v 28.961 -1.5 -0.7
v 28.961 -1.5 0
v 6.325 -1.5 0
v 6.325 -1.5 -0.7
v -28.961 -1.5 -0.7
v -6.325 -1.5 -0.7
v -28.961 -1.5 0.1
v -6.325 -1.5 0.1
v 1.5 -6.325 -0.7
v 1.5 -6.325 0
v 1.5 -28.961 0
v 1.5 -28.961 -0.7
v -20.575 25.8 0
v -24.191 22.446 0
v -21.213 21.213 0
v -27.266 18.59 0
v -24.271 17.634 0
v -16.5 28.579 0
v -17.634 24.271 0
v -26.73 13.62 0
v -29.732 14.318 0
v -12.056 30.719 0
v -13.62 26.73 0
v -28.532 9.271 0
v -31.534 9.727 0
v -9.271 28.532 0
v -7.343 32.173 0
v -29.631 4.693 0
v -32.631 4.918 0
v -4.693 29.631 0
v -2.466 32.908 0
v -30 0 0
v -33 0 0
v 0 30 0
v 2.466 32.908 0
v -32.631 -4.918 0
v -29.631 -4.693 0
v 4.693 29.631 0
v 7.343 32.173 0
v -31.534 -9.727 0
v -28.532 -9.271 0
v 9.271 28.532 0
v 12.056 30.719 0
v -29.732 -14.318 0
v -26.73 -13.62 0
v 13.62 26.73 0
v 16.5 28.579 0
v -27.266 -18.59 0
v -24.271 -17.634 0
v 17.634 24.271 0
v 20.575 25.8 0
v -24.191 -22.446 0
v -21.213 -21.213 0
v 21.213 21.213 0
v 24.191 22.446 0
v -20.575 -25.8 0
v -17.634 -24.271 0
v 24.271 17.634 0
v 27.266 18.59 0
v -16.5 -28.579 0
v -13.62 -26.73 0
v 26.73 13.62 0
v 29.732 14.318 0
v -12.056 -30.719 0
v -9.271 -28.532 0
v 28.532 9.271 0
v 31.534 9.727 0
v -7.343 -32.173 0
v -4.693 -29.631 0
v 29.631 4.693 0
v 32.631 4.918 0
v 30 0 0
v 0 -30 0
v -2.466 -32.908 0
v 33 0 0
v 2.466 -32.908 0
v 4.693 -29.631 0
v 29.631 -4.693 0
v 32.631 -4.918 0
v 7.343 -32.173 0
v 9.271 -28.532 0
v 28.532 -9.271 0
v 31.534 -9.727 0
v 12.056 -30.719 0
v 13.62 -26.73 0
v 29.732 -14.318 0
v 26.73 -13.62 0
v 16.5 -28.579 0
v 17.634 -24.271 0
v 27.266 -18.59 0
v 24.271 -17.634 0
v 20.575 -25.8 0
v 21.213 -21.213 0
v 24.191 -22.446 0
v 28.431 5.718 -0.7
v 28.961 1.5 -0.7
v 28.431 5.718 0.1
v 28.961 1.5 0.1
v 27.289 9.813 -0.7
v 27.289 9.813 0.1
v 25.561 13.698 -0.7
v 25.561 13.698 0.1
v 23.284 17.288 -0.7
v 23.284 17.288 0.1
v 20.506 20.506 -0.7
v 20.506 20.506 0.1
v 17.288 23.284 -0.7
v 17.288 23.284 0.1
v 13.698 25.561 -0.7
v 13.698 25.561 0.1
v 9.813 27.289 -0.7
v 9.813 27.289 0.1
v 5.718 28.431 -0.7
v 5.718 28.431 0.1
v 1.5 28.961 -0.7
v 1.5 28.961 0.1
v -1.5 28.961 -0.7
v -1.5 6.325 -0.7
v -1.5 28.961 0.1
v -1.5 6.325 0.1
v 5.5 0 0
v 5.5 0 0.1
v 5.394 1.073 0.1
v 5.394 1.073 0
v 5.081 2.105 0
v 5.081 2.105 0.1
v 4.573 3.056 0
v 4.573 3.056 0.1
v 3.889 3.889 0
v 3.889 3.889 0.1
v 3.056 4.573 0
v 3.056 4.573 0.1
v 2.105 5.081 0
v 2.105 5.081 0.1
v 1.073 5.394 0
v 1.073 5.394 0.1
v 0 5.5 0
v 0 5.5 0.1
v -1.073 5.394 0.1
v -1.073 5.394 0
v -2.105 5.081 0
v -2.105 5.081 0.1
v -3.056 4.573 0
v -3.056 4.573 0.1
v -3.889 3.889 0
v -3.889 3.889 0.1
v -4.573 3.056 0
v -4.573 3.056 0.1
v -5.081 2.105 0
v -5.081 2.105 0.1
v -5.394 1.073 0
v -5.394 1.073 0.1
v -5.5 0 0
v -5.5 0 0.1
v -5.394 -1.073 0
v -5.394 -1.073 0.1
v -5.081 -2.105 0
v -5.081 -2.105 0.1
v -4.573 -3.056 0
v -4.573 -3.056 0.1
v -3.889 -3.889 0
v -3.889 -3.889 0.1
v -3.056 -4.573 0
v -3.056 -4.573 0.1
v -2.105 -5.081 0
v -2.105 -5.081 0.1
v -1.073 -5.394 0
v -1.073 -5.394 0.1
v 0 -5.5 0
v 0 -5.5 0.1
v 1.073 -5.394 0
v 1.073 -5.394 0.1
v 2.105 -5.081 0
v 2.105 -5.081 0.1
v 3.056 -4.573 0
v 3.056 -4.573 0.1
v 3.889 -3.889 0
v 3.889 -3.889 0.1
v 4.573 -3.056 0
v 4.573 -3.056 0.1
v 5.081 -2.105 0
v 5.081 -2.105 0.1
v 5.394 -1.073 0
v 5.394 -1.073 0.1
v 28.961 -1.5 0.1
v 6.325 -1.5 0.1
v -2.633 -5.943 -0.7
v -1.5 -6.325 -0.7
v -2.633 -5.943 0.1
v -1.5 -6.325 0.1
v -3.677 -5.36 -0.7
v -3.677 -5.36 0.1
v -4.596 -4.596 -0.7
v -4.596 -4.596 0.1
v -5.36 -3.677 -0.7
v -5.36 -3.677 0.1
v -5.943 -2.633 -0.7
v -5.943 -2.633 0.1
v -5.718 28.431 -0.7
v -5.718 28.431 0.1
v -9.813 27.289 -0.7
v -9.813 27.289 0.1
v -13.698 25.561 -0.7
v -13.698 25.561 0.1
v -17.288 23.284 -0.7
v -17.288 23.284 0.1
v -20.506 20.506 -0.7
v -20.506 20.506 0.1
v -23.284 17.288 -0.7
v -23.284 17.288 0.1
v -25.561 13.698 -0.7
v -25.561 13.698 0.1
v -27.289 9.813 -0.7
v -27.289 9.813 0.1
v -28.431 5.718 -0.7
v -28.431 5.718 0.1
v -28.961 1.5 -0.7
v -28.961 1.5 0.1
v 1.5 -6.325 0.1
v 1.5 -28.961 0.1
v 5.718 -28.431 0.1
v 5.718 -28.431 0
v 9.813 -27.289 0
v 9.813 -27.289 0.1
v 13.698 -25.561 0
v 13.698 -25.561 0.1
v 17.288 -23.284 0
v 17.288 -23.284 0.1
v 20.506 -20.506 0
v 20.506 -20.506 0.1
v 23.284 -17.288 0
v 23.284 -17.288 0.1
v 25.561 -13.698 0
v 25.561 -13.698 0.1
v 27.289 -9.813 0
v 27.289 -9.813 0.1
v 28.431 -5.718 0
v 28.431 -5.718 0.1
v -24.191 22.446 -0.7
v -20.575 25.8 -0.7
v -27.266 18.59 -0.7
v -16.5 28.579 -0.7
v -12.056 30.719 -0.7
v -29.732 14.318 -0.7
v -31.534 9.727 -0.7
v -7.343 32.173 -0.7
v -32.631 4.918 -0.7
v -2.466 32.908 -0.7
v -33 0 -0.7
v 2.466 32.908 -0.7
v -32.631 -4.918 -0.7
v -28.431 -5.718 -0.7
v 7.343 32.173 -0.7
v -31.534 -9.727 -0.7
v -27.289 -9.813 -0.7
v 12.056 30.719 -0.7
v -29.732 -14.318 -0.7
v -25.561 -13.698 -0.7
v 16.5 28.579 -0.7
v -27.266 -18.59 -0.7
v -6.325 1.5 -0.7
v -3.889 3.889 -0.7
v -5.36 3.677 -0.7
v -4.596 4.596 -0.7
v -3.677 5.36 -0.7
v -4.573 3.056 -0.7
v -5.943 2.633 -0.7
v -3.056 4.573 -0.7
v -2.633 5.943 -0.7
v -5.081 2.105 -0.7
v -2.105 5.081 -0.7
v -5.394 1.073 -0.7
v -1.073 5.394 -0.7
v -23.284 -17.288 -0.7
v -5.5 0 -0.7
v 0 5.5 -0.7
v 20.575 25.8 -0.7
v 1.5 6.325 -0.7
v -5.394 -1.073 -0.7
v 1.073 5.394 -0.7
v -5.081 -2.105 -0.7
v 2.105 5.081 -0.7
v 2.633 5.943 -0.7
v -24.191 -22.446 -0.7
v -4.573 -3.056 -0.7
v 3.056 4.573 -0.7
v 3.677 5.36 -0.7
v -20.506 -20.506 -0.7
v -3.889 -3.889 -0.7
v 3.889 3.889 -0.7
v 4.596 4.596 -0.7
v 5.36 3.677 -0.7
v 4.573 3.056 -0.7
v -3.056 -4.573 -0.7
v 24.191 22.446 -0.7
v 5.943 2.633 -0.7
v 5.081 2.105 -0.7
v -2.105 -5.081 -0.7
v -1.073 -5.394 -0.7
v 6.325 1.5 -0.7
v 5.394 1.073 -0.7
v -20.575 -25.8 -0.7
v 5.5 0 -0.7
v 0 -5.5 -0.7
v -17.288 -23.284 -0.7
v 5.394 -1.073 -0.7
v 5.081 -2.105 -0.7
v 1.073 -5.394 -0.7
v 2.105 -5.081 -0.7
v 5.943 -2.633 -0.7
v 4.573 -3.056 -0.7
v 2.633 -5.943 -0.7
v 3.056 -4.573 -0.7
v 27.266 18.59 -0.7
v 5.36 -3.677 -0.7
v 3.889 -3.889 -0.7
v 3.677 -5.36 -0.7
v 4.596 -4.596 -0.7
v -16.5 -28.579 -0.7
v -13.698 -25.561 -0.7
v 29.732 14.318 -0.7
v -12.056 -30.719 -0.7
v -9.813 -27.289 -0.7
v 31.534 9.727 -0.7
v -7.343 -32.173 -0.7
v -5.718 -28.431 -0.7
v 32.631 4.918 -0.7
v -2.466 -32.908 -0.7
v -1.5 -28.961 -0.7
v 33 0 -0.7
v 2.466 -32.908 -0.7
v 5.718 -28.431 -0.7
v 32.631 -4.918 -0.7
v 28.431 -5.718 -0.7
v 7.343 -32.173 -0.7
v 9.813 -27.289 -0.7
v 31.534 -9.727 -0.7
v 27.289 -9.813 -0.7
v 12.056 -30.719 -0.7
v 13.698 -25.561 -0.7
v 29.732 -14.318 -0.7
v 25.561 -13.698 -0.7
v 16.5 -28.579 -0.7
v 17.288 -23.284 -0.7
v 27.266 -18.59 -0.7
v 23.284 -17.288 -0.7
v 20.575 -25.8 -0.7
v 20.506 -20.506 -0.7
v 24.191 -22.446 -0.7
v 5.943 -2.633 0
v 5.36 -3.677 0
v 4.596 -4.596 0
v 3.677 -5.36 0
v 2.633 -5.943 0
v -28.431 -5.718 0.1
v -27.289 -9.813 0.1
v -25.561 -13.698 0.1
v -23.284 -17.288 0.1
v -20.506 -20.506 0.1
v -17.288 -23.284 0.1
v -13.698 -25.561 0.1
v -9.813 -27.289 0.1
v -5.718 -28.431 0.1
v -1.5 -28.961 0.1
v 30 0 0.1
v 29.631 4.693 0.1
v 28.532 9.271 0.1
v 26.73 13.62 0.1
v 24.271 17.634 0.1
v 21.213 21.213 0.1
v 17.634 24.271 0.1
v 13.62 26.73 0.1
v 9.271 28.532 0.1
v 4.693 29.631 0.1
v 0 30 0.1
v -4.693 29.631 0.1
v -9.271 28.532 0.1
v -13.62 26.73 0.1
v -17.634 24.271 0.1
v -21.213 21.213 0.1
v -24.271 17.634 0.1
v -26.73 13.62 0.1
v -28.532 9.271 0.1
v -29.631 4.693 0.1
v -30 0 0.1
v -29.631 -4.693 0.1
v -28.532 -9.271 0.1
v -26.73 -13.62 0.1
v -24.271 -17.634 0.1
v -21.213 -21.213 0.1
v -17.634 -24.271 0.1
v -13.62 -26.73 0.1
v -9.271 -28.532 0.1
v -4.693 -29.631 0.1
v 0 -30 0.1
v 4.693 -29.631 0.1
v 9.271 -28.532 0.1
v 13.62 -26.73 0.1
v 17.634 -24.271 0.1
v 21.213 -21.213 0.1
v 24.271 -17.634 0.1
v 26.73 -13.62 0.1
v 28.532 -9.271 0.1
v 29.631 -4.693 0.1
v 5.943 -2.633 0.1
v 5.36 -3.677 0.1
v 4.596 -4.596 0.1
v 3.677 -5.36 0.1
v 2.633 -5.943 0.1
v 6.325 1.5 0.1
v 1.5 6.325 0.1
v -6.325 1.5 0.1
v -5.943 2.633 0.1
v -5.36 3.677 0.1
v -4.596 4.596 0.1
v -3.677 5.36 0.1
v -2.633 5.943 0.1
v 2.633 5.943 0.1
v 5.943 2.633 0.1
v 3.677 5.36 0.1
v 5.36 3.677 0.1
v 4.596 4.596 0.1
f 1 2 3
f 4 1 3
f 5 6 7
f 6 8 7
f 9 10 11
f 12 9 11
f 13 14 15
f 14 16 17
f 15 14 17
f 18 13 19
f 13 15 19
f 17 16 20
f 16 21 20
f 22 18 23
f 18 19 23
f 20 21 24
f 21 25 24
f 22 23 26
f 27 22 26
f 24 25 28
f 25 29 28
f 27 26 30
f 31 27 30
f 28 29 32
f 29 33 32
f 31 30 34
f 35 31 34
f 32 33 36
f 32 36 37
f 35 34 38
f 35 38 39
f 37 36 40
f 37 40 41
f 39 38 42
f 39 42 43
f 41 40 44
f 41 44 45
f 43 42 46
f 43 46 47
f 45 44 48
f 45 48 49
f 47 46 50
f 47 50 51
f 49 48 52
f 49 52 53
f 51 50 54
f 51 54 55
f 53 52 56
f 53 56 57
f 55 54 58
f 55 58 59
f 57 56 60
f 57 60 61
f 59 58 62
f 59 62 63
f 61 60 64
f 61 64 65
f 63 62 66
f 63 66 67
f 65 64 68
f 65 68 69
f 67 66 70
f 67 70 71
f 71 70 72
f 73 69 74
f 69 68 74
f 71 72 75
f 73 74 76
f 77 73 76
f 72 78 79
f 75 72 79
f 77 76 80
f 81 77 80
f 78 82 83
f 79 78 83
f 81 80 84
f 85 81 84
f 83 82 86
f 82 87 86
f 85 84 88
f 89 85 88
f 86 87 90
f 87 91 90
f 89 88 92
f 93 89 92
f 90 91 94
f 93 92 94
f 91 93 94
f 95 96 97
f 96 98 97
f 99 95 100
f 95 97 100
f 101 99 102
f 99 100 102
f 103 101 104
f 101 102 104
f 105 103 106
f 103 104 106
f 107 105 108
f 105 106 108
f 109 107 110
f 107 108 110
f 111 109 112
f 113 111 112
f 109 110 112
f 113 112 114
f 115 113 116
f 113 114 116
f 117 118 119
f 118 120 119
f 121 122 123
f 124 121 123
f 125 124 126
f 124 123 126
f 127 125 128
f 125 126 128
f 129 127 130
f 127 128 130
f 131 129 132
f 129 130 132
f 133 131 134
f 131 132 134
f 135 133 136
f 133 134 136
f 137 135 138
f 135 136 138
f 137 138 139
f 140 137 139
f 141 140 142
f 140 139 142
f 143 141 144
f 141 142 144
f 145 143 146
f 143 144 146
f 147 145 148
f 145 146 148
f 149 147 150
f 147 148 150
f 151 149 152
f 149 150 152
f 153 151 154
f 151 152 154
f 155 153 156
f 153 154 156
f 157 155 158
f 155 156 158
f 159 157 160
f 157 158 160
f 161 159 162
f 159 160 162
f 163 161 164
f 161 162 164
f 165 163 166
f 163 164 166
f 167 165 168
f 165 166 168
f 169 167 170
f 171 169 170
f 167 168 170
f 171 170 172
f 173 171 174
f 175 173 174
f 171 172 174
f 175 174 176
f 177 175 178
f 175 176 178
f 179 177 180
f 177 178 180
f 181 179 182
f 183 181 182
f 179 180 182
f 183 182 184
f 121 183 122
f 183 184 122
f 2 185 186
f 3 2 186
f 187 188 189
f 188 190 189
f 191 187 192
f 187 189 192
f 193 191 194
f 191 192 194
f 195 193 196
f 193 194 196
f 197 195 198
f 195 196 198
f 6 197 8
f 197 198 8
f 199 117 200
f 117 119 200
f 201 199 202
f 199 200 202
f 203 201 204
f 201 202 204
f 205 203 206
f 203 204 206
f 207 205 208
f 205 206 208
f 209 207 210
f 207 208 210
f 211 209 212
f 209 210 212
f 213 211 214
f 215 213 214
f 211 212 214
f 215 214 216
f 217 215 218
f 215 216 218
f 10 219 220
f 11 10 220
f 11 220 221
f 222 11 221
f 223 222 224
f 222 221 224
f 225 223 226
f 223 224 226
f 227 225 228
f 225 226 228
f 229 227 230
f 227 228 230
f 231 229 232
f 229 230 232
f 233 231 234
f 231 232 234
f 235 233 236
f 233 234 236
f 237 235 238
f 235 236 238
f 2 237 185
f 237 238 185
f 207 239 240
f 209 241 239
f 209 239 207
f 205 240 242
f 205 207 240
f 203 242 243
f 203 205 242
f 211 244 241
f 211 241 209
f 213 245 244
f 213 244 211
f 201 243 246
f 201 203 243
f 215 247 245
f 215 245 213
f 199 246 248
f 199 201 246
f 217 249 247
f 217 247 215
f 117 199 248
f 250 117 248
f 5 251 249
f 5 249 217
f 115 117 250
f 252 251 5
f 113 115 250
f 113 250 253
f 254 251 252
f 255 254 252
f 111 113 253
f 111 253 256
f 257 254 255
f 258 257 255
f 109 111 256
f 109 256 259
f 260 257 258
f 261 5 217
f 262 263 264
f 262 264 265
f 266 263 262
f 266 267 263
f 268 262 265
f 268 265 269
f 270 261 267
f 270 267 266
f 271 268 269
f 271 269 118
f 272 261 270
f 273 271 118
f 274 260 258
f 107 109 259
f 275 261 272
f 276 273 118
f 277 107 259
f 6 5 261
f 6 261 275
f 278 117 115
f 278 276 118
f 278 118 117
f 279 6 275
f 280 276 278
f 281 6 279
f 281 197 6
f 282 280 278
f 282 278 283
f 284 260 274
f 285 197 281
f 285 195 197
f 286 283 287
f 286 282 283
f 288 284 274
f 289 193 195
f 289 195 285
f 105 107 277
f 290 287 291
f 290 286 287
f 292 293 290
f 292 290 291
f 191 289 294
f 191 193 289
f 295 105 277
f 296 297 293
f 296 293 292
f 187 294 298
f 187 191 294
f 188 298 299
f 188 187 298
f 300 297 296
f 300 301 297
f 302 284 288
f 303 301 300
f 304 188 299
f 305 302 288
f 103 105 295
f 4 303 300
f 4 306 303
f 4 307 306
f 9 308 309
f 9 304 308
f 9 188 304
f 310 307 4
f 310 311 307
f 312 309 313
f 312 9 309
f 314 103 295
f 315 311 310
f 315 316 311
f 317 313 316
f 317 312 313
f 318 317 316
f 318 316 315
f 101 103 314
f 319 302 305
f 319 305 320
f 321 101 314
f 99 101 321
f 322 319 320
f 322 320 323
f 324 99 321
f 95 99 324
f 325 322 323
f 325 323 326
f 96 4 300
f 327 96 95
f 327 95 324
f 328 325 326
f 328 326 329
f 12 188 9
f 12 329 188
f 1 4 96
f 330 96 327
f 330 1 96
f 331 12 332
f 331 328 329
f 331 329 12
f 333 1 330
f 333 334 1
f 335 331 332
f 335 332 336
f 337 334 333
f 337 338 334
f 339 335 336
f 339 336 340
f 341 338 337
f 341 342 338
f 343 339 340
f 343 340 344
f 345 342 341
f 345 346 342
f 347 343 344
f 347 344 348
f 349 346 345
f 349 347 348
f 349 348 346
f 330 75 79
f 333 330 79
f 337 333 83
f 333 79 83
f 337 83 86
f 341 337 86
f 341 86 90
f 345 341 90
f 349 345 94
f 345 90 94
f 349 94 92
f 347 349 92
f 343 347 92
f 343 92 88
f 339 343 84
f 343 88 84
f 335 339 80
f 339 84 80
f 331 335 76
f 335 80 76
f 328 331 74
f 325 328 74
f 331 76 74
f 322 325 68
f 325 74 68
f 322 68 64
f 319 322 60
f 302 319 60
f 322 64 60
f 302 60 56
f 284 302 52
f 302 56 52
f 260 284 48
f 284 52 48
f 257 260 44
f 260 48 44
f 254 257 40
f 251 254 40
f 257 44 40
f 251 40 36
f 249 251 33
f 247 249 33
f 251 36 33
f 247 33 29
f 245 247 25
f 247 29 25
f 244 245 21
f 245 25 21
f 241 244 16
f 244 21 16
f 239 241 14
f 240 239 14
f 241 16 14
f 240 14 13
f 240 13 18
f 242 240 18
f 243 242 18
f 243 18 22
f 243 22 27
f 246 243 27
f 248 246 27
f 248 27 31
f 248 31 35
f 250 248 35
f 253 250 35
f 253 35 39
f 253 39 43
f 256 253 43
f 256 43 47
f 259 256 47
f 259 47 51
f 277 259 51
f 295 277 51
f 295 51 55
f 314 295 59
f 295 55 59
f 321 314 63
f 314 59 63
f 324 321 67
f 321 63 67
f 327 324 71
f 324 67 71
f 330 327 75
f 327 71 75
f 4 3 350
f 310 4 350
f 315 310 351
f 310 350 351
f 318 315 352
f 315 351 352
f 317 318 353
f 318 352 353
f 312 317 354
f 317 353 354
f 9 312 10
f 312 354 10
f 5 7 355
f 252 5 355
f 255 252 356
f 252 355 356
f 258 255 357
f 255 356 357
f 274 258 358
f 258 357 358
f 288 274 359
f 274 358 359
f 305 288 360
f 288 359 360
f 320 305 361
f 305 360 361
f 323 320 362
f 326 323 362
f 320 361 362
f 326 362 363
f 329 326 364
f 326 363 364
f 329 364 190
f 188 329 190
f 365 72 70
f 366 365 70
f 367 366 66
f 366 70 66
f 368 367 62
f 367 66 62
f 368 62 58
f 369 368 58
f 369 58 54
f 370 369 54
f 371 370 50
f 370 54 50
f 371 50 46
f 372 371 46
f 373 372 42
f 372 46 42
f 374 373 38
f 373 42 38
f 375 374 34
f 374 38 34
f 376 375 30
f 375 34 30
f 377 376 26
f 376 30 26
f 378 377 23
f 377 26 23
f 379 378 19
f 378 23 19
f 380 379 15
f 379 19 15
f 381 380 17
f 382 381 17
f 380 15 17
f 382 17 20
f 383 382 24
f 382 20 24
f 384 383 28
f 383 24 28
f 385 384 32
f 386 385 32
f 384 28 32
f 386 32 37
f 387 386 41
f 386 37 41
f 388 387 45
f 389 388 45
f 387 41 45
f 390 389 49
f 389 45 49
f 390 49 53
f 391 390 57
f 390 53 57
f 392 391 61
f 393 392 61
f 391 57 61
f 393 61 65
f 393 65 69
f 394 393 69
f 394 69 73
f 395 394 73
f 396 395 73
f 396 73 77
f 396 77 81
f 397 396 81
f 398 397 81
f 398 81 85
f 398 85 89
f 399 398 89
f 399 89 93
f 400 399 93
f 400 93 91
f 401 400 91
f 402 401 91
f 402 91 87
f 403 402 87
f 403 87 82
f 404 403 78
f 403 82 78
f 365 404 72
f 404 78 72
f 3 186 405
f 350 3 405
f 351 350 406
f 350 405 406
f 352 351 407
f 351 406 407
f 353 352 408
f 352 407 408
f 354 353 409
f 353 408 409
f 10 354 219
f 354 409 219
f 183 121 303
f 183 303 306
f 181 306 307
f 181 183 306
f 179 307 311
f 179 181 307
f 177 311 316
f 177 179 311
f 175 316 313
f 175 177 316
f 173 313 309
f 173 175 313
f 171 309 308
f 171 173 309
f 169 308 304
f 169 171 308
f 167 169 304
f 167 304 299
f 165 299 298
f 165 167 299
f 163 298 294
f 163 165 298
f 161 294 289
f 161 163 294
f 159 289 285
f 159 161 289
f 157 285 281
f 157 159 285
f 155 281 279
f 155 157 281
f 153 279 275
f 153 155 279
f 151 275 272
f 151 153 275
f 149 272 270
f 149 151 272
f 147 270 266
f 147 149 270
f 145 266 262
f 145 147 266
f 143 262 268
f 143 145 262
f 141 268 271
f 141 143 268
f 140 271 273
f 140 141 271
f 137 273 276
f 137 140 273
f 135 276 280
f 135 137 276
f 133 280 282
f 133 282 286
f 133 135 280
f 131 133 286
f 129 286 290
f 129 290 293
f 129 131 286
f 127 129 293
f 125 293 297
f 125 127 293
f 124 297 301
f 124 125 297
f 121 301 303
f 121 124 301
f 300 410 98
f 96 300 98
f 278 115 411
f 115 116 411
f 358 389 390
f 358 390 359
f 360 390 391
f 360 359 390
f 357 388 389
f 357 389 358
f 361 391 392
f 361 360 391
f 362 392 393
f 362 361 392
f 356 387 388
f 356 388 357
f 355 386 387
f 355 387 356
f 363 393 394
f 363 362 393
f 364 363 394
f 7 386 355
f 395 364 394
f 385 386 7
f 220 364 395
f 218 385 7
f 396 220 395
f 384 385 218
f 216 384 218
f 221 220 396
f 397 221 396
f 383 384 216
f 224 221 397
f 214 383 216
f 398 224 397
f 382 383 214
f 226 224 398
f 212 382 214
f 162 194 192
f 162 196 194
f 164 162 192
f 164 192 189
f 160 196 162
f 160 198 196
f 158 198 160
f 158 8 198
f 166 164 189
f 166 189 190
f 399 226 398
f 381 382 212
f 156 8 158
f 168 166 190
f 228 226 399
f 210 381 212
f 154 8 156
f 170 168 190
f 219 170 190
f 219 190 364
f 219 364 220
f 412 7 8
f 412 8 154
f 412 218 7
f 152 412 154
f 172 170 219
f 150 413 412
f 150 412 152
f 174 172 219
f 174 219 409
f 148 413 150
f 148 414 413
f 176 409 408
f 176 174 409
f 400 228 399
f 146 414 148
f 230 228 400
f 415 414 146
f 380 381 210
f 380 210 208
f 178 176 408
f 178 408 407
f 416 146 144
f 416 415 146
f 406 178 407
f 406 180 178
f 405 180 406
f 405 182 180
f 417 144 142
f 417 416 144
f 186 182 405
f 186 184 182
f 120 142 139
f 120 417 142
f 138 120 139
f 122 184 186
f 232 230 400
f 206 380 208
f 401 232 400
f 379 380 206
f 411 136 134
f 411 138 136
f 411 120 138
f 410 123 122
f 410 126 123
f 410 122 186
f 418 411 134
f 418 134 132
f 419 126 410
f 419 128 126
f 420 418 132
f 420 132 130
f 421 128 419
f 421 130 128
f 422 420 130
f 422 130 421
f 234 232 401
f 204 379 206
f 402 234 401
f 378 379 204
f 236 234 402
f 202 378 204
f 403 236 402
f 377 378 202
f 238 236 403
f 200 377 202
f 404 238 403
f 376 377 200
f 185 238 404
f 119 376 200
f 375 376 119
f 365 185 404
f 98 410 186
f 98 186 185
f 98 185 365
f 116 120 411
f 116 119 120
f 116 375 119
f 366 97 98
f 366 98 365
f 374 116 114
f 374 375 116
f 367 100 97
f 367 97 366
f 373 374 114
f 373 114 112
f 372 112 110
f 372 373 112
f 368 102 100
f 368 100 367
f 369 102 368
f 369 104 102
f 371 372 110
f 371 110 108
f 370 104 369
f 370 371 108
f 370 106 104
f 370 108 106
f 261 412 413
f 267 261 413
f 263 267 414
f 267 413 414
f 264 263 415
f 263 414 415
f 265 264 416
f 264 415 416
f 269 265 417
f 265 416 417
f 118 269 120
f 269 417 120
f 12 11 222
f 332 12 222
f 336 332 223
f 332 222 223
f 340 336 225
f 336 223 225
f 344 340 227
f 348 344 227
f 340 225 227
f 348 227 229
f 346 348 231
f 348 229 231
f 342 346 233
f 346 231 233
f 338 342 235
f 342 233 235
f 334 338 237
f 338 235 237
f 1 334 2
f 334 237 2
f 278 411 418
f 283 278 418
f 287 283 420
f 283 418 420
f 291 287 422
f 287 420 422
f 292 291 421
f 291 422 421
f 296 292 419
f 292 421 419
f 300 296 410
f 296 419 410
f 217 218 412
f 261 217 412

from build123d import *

# Parameters (mm, degrees)
F0_R     = 30
F1_DEPTH = 0.1
F2_R     = 5.5
F3_DEPTH = 0.1
F5_DEPTH = 0.1
F6_R     = 33
F6_R_2   = 30
F6_R_3   = 5.5
F7_DEPTH = 0.7


with BuildPart() as f1:
    # F0 (on Top) → F1 (new body)
    with BuildSketch(Plane.XY):
        Circle(F0_R)
    extrude(amount=F1_DEPTH)

    # F2 (on face) → F3 (cut, through all)
    with BuildSketch(Plane.XY.offset(0.1)):
        Circle(F2_R)
    extrude(amount=-F3_DEPTH, mode=Mode.SUBTRACT)

    # F4 (on face) → F5 (cut, through all)
    with BuildSketch(Plane.XY.offset(0.1)):
        with BuildLine():
            Line((6.3245553203, 1.5), (28.9611809151, 1.5))
            ThreePointArc((28.9611809151, 1.5), (20.5060966544, 20.5060966544), (1.5, 28.9611809151))
            Line((1.5, 28.9611809151), (1.5, 6.3245553203))
            ThreePointArc((1.5, 6.3245553203), (4.5961940777, 4.5961940777), (6.3245553203, 1.5))
        make_face()
        with BuildLine():
            Line((-1.5, 6.3245553203), (-1.5, 28.9611809151))
            ThreePointArc((-1.5, 28.9611809151), (-20.5060966544, 20.5060966544), (-28.9611809151, 1.5))
            Line((-28.9611809151, 1.5), (-6.3245553203, 1.5))
            ThreePointArc((-6.3245553203, 1.5), (-4.5961940777, 4.5961940777), (-1.5, 6.3245553203))
        make_face()
        with BuildLine():
            ThreePointArc((-28.9611809151, -1.5), (-20.5060966544, -20.5060966544), (-1.5, -28.9611809151))
            Line((-1.5, -28.9611809151), (-1.5, -6.3245553203))
            ThreePointArc((-1.5, -6.3245553203), (-4.5961940777, -4.5961940777), (-6.3245553203, -1.5))
            Line((-6.3245553203, -1.5), (-28.9611809151, -1.5))
        make_face()
        with BuildLine():
            ThreePointArc((1.5, -28.9611809151), (20.5060966544, -20.5060966544), (28.9611809151, -1.5))
            Line((28.9611809151, -1.5), (6.3245553203, -1.5))
            ThreePointArc((6.3245553203, -1.5), (4.5961940777, -4.5961940777), (1.5, -6.3245553203))
            Line((1.5, -6.3245553203), (1.5, -28.9611809151))
        make_face()
    extrude(amount=-F5_DEPTH, mode=Mode.SUBTRACT)

    # F6 (on face) → F7 (join)
    with BuildSketch(Plane(origin=(0, 0, 0), x_dir=(1, 0, 0), z_dir=(0, 0, -1))):
        Circle(F6_R)
        Circle(F6_R_2, mode=Mode.SUBTRACT)
        Circle(F6_R_2)
        with BuildLine():
            Line((-1.5, -6.3245553203), (-1.5, -28.9611809151))
            ThreePointArc((-1.5, -28.9611809151), (-20.5060966544, -20.5060966544), (-28.9611809151, -1.5))
            Line((-28.9611809151, -1.5), (-6.3245553203, -1.5))
            ThreePointArc((-6.3245553203, -1.5), (-4.5961940777, -4.5961940777), (-1.5, -6.3245553203))
        make_face(mode=Mode.SUBTRACT)
        with BuildLine():
            ThreePointArc((28.9611809151, -1.5), (20.5060966544, -20.5060966544), (1.5, -28.9611809151))
            Line((1.5, -28.9611809151), (1.5, -6.3245553203))
            ThreePointArc((1.5, -6.3245553203), (4.5961940777, -4.5961940777), (6.3245553203, -1.5))
            Line((6.3245553203, -1.5), (28.9611809151, -1.5))
        make_face(mode=Mode.SUBTRACT)
        with BuildLine():
            ThreePointArc((-1.5, 6.3245553203), (-4.5961940777, 4.5961940777), (-6.3245553203, 1.5))
            Line((-6.3245553203, 1.5), (-28.9611809151, 1.5))
            ThreePointArc((-28.9611809151, 1.5), (-20.5060966544, 20.5060966544), (-1.5, 28.9611809151))
            Line((-1.5, 28.9611809151), (-1.5, 6.3245553203))
        make_face(mode=Mode.SUBTRACT)
        Circle(F6_R_3, mode=Mode.SUBTRACT)
        with BuildLine():
            Line((1.5, 6.3245553203), (1.5, 28.9611809151))
            ThreePointArc((1.5, 28.9611809151), (20.5060966544, 20.5060966544), (28.9611809151, 1.5))
            Line((28.9611809151, 1.5), (6.3245553203, 1.5))
            ThreePointArc((6.3245553203, 1.5), (4.5961940777, 4.5961940777), (1.5, 6.3245553203))
        make_face(mode=Mode.SUBTRACT)
    extrude(amount=F7_DEPTH)


solid = f1.part
